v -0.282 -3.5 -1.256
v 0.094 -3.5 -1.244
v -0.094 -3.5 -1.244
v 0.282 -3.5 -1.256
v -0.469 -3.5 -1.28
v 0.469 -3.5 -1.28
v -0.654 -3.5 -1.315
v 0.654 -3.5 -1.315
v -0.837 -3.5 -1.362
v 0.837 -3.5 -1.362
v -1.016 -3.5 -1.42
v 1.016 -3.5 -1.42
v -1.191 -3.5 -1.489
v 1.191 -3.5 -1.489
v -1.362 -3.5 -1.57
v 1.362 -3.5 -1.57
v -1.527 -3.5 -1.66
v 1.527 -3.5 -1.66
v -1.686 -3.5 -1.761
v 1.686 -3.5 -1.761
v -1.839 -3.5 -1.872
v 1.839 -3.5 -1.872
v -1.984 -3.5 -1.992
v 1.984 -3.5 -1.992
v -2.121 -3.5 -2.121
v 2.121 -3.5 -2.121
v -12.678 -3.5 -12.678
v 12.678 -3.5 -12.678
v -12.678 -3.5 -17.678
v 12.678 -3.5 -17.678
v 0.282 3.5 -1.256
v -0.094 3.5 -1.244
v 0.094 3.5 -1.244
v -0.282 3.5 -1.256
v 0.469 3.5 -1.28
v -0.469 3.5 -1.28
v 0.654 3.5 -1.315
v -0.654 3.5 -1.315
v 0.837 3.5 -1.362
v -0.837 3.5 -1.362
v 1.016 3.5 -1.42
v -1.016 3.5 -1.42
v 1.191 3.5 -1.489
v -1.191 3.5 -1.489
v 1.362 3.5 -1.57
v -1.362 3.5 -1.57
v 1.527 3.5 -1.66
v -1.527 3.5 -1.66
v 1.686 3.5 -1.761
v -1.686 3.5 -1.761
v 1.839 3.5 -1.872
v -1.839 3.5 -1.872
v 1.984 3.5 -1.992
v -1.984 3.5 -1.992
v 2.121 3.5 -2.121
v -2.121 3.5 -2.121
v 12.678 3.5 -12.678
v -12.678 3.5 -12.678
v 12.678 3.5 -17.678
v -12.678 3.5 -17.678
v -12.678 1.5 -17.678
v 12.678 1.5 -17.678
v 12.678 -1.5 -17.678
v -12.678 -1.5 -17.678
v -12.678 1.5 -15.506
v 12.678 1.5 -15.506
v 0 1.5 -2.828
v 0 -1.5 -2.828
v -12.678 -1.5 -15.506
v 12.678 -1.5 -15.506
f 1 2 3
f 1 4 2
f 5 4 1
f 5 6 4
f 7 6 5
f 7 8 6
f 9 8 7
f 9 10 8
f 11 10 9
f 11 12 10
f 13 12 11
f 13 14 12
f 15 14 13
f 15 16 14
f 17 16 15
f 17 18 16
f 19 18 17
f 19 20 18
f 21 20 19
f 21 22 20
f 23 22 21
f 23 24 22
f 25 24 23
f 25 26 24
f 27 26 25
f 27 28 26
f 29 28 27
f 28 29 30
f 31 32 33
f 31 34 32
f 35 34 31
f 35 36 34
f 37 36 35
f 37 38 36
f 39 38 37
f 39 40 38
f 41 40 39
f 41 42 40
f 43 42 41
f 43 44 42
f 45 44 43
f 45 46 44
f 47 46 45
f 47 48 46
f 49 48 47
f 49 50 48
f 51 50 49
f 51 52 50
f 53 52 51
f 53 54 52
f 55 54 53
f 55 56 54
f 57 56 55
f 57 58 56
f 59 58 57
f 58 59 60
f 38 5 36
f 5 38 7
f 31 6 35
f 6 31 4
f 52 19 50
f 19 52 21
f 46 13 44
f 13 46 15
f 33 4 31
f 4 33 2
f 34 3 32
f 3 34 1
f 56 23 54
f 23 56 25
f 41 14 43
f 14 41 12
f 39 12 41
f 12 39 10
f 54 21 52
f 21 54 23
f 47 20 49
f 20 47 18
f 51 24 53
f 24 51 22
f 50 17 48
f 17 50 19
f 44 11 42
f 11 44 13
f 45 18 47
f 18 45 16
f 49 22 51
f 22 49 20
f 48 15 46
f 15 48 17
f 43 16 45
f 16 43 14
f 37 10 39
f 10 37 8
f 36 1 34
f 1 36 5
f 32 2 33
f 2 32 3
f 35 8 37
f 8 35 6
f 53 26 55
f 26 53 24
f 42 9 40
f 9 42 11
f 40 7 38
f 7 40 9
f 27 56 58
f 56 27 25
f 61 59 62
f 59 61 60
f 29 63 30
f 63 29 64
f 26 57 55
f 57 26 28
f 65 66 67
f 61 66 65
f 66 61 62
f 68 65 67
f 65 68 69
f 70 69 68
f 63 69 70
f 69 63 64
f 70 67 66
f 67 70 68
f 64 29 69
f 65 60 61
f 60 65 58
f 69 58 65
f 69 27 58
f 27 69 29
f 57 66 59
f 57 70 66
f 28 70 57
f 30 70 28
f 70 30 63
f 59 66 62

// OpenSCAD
edge_length = 25;
edge_stop_length = edge_length - 10;
wall_width = 2;
wall_height = 2;
slot_height = 3;

total_height = 2 * wall_height + slot_height;

round_radius = 3;


// Rotate everything so that the long side points down
rotate([90,135,0])

// Construct body
difference() {
    // Outer extruded triangle
    linear_extrude(height = total_height, center = true, convexity = 10, $fn=100) {
        polygon(points=[[0,0],[edge_length,0],[0,edge_length]], paths=[[0,1,2]]);
    }

    // Inner extruded triangle
    linear_extrude(height = slot_height, center = true, convexity = 10, $fn=100) {
        polygon(points=[[wall_width,wall_width],[edge_length,wall_width],[wall_width,edge_length]], paths=[[0,1,2]]);
    }

    // Round off 90deg corner
    difference(){
        cube([2*round_radius,2*round_radius,total_height], center = true);

        translate([round_radius, round_radius, 0])
            cylinder (h = total_height, r=round_radius, center = true, $fn=100);
    }

    // Cut off 45deg corners
    translate([edge_length, 0, 0])
        rotate([0,0,45])
            cube([edge_length - edge_stop_length, edge_length - edge_stop_length, edge_length - edge_stop_length], center=true);
    translate([0, edge_length, 0])
        rotate([0,0,45])
            cube([edge_length - edge_stop_length, edge_length - edge_stop_length, edge_length - edge_stop_length], center=true);
}
